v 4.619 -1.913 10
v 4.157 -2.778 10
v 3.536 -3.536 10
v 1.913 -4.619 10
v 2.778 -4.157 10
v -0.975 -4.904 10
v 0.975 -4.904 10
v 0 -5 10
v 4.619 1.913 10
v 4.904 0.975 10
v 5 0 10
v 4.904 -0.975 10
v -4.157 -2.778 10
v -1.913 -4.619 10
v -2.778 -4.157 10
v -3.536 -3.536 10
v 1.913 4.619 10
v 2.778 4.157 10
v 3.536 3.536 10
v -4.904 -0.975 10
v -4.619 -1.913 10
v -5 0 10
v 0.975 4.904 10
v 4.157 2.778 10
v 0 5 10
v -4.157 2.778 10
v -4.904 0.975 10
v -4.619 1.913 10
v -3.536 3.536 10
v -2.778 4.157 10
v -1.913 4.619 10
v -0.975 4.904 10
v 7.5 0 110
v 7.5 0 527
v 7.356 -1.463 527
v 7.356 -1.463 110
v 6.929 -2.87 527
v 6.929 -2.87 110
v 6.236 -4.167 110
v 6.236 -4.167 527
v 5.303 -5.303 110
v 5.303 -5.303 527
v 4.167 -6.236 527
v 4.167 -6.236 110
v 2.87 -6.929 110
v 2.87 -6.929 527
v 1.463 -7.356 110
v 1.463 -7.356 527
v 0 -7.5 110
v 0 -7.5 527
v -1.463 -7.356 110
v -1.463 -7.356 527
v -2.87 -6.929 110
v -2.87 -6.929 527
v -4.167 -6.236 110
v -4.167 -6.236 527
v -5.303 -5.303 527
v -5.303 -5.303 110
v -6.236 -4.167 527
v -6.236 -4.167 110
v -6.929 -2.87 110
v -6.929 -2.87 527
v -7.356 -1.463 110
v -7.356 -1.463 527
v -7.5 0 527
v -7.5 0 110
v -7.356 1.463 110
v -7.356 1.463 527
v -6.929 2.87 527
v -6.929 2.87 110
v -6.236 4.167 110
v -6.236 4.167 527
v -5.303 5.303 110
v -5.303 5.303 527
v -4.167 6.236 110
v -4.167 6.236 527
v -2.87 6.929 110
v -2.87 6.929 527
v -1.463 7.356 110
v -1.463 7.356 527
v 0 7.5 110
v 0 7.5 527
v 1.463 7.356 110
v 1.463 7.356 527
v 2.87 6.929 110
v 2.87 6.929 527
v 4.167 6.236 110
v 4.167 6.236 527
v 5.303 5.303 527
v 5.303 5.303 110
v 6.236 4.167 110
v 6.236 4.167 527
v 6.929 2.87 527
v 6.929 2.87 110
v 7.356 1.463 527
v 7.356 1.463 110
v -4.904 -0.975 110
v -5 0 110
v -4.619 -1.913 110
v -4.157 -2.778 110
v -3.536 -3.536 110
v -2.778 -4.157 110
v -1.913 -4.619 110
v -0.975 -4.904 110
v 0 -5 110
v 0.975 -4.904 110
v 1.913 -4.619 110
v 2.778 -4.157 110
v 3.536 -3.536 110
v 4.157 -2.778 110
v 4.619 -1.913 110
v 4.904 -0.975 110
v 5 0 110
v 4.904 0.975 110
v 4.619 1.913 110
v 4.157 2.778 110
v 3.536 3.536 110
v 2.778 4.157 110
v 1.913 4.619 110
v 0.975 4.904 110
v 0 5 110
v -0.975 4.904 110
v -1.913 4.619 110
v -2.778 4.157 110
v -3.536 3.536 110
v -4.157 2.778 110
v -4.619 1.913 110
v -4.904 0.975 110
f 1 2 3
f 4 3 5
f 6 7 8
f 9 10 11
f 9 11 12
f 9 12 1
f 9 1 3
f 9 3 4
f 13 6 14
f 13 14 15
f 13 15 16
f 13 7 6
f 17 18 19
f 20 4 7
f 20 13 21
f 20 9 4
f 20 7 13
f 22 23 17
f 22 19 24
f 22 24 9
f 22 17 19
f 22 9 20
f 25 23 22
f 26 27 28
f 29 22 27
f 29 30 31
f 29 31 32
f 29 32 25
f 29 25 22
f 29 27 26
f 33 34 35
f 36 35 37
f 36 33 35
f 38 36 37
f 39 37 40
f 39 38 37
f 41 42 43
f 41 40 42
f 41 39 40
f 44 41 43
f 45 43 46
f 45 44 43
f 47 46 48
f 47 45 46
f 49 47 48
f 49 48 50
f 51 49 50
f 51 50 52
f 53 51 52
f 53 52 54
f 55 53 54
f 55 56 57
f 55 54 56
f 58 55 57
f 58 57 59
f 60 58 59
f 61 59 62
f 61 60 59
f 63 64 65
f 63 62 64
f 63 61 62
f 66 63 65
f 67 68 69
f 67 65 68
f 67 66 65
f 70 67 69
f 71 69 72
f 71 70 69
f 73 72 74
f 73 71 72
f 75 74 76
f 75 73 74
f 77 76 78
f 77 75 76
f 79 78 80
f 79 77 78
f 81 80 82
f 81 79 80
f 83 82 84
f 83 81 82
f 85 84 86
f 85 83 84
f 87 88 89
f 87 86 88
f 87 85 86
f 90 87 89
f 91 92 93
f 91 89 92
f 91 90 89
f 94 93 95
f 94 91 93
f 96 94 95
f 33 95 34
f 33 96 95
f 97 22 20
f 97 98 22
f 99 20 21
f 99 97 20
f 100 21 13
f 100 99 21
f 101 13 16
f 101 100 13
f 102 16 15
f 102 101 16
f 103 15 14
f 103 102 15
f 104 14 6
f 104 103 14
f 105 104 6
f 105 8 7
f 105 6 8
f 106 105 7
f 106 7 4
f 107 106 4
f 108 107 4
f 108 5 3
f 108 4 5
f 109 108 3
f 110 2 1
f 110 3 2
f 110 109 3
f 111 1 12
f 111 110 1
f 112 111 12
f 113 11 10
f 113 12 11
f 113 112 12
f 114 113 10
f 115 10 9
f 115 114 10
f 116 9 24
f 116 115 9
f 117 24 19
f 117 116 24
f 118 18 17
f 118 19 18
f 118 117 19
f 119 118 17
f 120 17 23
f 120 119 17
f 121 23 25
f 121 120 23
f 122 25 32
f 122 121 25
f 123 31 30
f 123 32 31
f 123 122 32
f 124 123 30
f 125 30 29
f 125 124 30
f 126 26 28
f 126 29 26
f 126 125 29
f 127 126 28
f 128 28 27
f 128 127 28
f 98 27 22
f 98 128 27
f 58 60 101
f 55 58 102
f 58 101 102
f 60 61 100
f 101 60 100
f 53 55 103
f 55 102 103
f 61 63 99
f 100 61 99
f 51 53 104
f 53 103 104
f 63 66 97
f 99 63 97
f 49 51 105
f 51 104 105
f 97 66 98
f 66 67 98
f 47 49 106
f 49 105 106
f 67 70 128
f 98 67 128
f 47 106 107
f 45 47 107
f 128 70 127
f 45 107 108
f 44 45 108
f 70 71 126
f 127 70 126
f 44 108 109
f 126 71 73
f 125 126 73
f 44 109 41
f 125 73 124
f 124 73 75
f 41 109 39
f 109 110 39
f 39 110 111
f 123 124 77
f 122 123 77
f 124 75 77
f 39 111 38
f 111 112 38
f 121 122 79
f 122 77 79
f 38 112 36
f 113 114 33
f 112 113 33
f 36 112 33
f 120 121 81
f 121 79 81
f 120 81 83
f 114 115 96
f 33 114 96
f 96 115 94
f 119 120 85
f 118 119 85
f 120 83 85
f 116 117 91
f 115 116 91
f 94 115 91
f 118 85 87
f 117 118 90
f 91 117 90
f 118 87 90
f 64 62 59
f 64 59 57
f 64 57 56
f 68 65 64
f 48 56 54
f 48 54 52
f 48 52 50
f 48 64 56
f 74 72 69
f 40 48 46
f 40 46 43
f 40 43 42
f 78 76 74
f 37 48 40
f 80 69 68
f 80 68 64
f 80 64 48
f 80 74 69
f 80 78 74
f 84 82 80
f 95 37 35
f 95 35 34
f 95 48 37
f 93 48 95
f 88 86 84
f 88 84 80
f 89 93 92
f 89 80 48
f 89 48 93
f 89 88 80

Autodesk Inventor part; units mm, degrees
ref_plane "YZ Plane" through (0, 0, 0) normal (1, 0, 0) x (0, 1, 0)
ref_plane "XZ Plane" through (0, 0, 0) normal (0, 1, 0) x (-1, 0, 0)
ref_plane "XY Plane" through (0, 0, 0) normal (0, 0, 1) x (1, 0, 0)
sketch "Sketch1" plane through (0, 0, 0) normal (0, 0, 1) x (1, 0, 0)
  circle A0 centre (0, 0) radius 25
  dimension "d0" = 50
extrude "Extrusion1" add sketch "Sketch1" along normal blind 10
sketch "Sketch2" plane through (0, 0, 10) normal (0, 0, 1) x (1, 0, 0)
  circle A0 centre (0, 0) radius 6.5
  dimension "d3" = 13
extrude "Extrusion2" add sketch "Sketch2" along normal blind 100
fillet "Fillet1" radius 1 1 edges at (-6.5, 0, 10)
sketch "Sketch4" plane through (0, 0, 0) normal (0, 0, -1) x (-1, 0, 0)
  arc A0 (19.3649, 5) -> (5, 19.3649) centre (0, 0) ccw
  line L0 (2.5, 17.4284) -> (2.5, 9.4868)
  line L1 (9.4868, 2.5) -> (17.4284, 2.5)
  arc A1 (5, 19.3649) -> (2.5, 17.4284) centre (4.5, 17.4284) ccw
  arc A2 (17.4284, 2.5) -> (19.3649, 5) centre (17.4284, 4.5) ccw
  arc A3 (2.5, 8.3666) -> (2.5153, 8.1193) centre (4.5, 8.3666) ccw
  arc A4 (8.1193, 2.5153) -> (8.3666, 2.5) centre (8.3666, 4.5) ccw
  arc A5 (7.6798, 3.6429) -> (3.6429, 7.6798) centre (0, 0) ccw
  arc A6 (2.5, 9.4868) -> (3.6429, 7.6798) centre (4.5, 9.4868) ccw
  arc A7 (7.6798, 3.6429) -> (9.4868, 2.5) centre (9.4868, 4.5) ccw
  point P0 (2.5, 19.8431)
  point P1 (19.8431, 2.5)
  point P2 (2.5, 7.0711)
  point P3 (7.0711, 2.5)
extrude "Extrusion3" cut sketch "Sketch4" against normal blind 10
pattern_circular "Circular Pattern1" count 4 over 360 about axis through (0, 0, 11) along (0, 0, -1) of "Extrusion3"
sketch "Sketch7" plane through (0, 0, 110) normal (0, 0, 1) x (1, 0, 0)
  circle A0 centre (0, 0) radius 7.5
  dimension "d38" = 15
extrude "Extrusion5" add sketch "Sketch7" along normal blind 417
sketch "Sketch8" plane through (0, 0, 527) normal (0, 0, 1) x (1, 0, 0)
  circle A0 centre (0, 0) radius 6.5
  dimension "d41" = 13
extrude "Extrusion6" add sketch "Sketch8" along normal blind 10
sketch "Sketch9" plane through (0, 0, 537) normal (0, 0, 1) x (1, 0, 0)
  circle A0 centre (0, 0) radius 10
  dimension "d44" = 20
extrude "Extrusion7" add sketch "Sketch9" along normal blind 2.5
thread "Thread1" size "M15x1.5" class "6g" standard "ANSI Metric M Profile" length 417
sketch "Sketch10" plane through (0, 0, 539.5) normal (0, 0, 1) x (1, 0, 0)
  circle A0 centre (0, 0) radius 10
extrude "Extrusion8" cut sketch "Sketch10" against normal blind 12.5
sketch "Sketch11" plane through (0, 0, 0) normal (0, 0, -1) x (-1, 0, 0)
  circle A0 centre (0, 0) radius 25 projected
  circle A1 centre (0, 0) radius 25
extrude "Extrusion9" cut sketch "Sketch11" against normal blind 110
sketch "Sketch12" plane through (0, 0, 110) normal (0, 0, -1) x (-1, 0, 0)
  circle A0 centre (0, 0) radius 5
  dimension "d53" = 10
extrude "Extrusion10" add sketch "Sketch12" along normal blind 100
properties part number "leadscrew_latest" material "Steel, Alloy"
